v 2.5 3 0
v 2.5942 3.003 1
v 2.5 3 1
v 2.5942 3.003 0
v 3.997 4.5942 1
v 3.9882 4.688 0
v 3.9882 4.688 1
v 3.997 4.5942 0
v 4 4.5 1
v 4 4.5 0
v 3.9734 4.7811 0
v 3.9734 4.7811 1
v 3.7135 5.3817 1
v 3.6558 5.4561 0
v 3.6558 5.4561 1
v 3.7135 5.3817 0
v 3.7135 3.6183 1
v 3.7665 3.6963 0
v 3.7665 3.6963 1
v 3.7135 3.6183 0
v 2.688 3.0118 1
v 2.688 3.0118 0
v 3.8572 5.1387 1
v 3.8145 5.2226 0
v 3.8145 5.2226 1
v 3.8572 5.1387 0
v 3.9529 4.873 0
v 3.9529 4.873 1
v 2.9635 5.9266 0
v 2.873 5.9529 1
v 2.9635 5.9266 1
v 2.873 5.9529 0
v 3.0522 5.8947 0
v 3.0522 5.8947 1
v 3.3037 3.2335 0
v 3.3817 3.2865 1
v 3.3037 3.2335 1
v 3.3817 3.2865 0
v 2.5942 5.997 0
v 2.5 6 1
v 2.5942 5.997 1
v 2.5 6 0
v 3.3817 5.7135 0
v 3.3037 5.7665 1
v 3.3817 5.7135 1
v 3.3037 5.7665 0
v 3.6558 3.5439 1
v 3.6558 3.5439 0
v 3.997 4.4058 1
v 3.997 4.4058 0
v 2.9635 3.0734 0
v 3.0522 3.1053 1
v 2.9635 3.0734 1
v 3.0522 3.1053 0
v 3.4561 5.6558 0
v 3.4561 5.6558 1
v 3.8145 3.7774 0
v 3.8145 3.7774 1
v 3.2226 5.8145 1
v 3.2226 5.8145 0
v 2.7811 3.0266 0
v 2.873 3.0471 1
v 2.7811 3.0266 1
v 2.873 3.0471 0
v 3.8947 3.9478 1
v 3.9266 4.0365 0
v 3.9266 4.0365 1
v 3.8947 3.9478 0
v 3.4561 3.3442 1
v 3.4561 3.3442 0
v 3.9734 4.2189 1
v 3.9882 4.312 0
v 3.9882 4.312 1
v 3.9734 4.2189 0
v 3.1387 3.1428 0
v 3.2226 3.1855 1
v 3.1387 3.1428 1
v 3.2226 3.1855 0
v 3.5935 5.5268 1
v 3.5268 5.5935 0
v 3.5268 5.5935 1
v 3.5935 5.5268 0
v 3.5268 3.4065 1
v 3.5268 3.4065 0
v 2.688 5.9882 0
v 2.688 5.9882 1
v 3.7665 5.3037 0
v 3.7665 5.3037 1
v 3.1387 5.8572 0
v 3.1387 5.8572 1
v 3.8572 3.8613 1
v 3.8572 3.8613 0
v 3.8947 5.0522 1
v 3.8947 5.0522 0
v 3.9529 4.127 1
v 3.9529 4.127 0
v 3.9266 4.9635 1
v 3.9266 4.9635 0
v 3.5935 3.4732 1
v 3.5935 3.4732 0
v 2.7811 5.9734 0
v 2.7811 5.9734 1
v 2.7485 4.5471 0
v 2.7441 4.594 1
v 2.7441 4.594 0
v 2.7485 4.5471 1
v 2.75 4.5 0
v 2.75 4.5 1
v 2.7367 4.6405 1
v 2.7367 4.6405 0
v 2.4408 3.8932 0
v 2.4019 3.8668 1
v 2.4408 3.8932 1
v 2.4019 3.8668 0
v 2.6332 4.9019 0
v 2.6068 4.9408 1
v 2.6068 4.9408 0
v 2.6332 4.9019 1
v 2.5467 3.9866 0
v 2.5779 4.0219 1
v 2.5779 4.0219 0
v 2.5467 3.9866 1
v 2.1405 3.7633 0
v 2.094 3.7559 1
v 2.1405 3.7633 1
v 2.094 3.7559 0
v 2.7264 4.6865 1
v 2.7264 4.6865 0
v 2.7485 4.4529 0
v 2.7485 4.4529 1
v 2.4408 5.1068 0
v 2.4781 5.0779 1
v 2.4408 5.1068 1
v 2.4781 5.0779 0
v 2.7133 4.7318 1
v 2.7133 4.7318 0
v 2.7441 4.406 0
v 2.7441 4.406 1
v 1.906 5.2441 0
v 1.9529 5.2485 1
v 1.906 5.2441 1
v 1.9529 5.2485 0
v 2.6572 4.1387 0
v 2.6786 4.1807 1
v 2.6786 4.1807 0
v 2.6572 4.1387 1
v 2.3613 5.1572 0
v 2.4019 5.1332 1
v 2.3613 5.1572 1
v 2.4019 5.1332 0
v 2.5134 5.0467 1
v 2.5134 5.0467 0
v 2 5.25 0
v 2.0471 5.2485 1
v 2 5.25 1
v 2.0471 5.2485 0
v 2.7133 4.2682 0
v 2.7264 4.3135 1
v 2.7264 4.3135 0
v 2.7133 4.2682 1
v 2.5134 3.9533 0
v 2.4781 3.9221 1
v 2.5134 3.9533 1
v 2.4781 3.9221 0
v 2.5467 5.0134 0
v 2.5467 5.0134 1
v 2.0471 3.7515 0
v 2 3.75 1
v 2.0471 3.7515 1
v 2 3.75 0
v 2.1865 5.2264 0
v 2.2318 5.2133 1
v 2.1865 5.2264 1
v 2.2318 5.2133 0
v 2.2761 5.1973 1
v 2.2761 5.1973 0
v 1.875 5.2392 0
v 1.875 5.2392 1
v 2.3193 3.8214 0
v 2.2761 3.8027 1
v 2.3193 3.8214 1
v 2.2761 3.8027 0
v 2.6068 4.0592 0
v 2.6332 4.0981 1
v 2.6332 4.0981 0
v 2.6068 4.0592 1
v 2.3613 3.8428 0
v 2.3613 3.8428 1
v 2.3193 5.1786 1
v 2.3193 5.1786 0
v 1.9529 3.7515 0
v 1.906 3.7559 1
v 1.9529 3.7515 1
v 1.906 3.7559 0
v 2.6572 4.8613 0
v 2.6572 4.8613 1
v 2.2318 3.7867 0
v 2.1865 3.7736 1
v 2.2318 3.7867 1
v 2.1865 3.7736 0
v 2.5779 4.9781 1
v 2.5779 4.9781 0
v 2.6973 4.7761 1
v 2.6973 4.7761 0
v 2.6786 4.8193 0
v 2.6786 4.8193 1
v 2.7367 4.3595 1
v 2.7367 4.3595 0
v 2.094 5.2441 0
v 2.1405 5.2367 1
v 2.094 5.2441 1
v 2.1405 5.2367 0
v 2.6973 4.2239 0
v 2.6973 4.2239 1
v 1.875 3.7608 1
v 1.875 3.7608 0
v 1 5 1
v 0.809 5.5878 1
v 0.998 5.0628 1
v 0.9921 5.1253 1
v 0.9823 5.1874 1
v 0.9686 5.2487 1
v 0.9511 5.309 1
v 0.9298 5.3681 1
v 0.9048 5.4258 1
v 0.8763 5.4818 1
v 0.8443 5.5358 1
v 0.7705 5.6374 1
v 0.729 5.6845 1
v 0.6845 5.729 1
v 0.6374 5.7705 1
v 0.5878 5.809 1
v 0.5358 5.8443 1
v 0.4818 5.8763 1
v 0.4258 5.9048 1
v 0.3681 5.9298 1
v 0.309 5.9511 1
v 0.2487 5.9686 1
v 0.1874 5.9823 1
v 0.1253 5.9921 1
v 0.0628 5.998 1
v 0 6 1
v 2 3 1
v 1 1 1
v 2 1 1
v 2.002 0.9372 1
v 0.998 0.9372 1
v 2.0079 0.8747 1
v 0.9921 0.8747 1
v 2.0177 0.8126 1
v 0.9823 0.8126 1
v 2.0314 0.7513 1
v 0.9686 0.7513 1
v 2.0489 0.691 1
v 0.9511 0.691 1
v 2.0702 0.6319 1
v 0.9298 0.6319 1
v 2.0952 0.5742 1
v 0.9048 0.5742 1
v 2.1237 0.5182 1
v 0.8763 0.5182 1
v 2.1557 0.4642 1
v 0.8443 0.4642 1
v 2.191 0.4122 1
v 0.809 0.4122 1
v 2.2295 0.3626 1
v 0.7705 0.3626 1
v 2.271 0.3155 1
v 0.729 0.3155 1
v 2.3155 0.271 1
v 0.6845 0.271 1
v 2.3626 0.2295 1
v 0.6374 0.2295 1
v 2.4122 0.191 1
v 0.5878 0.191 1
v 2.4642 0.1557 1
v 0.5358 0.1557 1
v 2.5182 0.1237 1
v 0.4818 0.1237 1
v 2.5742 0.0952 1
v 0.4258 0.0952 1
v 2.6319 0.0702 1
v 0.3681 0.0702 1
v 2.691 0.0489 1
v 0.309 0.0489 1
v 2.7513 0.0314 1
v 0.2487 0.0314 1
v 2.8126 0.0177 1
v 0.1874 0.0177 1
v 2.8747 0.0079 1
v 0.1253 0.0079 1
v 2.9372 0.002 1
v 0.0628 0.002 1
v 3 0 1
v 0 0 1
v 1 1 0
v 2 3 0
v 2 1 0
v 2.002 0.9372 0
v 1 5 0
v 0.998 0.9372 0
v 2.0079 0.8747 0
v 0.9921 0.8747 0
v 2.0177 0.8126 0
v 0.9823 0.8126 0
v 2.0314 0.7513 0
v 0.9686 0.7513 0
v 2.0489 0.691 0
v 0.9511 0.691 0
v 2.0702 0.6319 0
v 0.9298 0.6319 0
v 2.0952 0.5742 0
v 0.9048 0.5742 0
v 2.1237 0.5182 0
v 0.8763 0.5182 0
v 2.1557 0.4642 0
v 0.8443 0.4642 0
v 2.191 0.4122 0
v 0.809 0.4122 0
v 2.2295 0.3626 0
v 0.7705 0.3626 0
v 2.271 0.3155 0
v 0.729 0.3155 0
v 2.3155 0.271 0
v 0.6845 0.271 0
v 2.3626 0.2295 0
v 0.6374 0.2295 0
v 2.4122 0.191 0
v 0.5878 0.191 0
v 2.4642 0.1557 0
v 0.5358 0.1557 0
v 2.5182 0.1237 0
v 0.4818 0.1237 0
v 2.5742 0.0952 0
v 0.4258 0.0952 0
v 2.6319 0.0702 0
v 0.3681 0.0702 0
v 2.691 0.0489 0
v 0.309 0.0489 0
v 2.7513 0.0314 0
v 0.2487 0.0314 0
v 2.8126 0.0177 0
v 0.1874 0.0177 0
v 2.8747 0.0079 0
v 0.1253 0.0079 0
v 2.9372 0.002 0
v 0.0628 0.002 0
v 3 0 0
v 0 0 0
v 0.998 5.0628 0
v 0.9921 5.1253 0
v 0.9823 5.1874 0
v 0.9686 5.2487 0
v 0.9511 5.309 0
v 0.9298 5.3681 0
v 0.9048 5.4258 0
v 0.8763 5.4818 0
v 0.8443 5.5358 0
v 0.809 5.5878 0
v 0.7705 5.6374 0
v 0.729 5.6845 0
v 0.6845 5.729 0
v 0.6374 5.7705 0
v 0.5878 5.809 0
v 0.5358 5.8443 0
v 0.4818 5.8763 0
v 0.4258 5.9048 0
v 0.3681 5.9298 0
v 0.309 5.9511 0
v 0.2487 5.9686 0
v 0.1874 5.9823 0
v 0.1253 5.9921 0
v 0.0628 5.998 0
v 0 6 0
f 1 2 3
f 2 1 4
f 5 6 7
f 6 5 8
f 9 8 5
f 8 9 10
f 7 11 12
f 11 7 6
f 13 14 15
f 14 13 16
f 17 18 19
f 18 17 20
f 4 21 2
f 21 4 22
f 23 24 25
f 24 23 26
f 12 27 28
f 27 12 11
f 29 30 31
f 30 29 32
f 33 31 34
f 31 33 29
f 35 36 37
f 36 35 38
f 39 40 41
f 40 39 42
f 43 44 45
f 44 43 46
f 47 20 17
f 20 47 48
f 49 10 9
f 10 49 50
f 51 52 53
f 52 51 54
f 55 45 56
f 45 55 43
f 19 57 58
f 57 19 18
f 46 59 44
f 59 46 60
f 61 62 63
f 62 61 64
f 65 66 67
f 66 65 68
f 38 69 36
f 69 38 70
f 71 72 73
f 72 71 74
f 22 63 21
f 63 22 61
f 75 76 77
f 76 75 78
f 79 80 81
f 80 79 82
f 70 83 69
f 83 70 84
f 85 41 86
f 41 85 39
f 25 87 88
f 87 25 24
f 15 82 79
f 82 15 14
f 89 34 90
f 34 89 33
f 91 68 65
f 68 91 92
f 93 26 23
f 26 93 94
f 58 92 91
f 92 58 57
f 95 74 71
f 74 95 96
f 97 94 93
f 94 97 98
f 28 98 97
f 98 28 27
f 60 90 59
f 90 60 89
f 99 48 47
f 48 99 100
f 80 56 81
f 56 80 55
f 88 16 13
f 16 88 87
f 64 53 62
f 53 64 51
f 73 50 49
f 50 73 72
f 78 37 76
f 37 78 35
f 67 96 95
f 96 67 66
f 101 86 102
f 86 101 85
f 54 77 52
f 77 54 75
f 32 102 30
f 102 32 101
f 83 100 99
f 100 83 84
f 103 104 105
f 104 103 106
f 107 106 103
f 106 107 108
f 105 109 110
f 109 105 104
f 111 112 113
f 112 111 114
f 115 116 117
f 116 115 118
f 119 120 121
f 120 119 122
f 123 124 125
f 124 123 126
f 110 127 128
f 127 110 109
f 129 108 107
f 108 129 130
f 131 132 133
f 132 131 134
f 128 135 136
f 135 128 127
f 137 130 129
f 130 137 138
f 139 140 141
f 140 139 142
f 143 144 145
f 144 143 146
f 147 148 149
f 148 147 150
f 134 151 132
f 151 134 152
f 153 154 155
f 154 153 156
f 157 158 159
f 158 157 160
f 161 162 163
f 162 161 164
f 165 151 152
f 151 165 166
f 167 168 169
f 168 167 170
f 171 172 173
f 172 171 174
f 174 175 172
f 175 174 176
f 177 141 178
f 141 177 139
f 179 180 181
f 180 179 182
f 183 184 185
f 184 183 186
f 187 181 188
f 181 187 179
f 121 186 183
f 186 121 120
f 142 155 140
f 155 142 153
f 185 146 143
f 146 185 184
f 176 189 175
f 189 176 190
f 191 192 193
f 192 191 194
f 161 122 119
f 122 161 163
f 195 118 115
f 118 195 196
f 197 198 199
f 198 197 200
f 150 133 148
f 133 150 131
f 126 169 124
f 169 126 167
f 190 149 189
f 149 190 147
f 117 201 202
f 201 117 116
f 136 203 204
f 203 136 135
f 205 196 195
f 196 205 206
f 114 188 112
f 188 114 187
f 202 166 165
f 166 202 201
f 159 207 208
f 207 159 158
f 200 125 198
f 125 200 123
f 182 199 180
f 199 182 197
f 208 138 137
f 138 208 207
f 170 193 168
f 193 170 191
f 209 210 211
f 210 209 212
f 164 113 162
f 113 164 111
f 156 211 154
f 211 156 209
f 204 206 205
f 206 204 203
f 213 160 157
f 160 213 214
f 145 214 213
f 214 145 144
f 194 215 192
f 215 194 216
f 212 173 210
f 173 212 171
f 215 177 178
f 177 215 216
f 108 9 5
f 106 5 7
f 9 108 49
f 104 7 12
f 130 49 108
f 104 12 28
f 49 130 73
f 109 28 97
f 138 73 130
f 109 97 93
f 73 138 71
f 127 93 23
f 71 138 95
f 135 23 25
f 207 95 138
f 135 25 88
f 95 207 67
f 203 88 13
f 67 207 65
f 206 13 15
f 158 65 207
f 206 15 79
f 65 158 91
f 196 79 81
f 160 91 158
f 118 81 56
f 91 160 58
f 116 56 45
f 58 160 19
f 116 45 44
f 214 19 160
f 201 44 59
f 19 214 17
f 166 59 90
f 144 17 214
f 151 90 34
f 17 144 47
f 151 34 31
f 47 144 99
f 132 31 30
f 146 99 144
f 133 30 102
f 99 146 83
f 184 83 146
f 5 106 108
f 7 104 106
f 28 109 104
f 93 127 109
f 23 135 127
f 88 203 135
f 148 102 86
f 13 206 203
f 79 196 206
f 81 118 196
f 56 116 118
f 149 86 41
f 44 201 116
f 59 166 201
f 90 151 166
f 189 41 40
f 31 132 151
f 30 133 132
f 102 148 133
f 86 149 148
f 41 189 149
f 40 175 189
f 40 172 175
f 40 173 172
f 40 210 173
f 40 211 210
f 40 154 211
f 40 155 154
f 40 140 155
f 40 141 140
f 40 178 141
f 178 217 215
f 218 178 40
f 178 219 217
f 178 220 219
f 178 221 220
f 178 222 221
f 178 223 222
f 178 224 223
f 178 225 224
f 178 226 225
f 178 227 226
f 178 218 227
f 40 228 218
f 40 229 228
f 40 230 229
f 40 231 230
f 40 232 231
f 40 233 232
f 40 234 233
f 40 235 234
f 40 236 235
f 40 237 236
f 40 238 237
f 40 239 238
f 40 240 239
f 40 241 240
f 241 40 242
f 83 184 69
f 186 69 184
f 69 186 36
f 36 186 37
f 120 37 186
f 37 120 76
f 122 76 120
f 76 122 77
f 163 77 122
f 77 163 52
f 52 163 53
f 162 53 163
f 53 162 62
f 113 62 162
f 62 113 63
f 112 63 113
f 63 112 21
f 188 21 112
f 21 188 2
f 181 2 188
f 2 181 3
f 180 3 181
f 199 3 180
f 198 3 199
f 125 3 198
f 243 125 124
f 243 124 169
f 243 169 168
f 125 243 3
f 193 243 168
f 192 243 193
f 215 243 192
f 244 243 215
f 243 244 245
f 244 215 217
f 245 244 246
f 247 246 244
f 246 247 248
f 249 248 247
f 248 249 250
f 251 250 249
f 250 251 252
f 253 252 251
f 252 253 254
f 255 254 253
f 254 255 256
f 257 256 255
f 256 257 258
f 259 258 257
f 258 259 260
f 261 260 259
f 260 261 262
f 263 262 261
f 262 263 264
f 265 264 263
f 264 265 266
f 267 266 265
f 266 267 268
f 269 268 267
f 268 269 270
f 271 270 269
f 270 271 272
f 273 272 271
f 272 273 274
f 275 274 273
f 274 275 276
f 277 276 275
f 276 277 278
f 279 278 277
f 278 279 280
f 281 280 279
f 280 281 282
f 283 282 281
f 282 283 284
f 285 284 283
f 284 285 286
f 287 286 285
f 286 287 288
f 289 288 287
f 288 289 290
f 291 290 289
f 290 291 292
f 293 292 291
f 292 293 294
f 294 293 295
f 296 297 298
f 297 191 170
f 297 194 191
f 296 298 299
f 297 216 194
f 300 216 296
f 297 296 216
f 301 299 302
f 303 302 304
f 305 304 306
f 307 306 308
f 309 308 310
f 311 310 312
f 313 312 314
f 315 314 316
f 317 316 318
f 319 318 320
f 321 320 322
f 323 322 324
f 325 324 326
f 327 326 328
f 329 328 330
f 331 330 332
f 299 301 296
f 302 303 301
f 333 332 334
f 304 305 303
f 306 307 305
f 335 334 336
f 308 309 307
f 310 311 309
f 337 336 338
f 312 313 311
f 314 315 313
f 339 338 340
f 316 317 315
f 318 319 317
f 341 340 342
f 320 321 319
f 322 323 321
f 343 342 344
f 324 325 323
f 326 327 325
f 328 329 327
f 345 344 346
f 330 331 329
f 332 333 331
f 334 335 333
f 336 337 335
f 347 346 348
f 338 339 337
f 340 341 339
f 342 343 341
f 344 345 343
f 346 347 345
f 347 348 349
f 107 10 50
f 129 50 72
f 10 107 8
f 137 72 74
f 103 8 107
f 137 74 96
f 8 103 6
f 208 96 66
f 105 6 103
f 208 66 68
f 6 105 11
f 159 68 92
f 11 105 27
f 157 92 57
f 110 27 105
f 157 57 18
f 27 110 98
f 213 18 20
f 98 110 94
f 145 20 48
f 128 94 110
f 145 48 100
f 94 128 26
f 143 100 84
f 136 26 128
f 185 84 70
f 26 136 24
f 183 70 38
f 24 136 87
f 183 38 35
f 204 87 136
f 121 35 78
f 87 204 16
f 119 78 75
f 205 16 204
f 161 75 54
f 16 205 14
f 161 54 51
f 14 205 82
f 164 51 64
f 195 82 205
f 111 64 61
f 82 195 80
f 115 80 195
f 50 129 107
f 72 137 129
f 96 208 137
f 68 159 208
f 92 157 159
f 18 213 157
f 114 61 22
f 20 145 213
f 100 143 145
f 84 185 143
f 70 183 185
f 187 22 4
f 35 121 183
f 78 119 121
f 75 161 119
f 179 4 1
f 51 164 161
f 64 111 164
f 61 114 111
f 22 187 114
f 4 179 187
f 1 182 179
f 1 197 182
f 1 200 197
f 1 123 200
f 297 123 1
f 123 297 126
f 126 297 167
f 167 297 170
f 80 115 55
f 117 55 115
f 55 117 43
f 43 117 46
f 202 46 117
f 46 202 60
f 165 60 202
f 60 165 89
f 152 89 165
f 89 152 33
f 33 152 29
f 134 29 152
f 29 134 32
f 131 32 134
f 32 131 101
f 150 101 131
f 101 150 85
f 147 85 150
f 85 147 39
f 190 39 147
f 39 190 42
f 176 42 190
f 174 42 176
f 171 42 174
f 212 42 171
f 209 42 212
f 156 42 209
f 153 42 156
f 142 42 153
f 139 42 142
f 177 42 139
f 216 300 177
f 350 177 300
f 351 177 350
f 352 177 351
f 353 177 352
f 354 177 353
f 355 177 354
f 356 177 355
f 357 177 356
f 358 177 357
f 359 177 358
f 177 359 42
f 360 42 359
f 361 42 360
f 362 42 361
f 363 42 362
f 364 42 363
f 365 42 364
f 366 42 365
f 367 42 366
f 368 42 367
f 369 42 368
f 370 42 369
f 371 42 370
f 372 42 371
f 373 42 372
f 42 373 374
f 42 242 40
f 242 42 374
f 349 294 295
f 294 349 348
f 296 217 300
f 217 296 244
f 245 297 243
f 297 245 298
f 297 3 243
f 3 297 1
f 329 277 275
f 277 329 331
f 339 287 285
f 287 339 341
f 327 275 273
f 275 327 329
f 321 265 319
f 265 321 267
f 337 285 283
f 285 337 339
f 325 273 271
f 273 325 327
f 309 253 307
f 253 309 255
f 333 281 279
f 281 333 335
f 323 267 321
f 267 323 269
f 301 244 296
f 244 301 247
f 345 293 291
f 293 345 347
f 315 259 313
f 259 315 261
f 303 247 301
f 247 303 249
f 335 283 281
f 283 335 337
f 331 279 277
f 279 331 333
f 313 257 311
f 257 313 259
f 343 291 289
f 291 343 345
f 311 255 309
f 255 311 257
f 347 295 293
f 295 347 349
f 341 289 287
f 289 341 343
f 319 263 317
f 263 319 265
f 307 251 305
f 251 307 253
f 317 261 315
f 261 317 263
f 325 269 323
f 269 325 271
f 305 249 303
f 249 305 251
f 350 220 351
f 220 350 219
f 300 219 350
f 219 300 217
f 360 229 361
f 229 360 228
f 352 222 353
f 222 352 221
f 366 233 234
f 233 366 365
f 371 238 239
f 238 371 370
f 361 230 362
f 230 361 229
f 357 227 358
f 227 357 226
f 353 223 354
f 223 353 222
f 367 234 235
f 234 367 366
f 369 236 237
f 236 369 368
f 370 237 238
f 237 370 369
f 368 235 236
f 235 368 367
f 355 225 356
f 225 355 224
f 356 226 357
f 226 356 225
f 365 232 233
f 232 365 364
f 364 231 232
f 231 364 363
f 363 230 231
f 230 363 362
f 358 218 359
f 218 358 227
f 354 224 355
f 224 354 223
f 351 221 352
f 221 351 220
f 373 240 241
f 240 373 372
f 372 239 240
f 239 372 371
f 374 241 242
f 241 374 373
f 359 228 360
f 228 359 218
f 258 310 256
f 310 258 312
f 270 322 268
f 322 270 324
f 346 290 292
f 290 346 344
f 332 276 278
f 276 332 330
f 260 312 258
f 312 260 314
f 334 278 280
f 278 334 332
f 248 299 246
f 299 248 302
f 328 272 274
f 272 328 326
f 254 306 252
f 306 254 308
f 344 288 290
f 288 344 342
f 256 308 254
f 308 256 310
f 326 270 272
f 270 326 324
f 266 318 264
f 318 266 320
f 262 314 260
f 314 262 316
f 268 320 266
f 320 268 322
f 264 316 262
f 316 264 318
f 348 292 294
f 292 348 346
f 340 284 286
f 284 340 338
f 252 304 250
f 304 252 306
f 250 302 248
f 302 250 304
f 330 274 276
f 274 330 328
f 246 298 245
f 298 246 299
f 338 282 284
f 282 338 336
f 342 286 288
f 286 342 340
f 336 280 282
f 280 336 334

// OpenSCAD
# difference() {
    // main body
    cube([4, 6, 1]);

    // left hand side removal
    translate([-1, 1, -1]) {
        cube([2, 4, 3]);
    }
    // right hand side lower removal
    translate([2, 1, -1]) {
        cube([5, 2, 3]);
    }
    
    // remove stuff to right of bot right serif
    translate([3, -1, -1]) {
        cube([5, 2, 3]);
    }
    translate([0, 1, -1]) {
        cylinder(3, r=1, $fn=100);
    }
    translate([0, 5, -1]) {
        cylinder(3, r=1, $fn=100);
    }
    translate([3, 1, -1]) {
        cylinder(3, r=1, $fn=100);
    }
    translate([2.5, 2.5, -0.5]) {
        difference() { 
            cube([4, 4, 2]);
            translate([0, 2,-2]) {
                cylinder(5, r=1.5, $fn=100);
            }
        }
    }
    translate([2, 4.5, -1]) {
        difference() {
            cylinder(3, r=0.75, $fn=100);
            translate([-1.125, -2, -1]) {
                cube([1, 3, 5]);
            }
        }
    }
}
//translate([4, 0, 0]) {
//    text("P", size=6, font="Times New Roman" );
//}

color("red") {
}
